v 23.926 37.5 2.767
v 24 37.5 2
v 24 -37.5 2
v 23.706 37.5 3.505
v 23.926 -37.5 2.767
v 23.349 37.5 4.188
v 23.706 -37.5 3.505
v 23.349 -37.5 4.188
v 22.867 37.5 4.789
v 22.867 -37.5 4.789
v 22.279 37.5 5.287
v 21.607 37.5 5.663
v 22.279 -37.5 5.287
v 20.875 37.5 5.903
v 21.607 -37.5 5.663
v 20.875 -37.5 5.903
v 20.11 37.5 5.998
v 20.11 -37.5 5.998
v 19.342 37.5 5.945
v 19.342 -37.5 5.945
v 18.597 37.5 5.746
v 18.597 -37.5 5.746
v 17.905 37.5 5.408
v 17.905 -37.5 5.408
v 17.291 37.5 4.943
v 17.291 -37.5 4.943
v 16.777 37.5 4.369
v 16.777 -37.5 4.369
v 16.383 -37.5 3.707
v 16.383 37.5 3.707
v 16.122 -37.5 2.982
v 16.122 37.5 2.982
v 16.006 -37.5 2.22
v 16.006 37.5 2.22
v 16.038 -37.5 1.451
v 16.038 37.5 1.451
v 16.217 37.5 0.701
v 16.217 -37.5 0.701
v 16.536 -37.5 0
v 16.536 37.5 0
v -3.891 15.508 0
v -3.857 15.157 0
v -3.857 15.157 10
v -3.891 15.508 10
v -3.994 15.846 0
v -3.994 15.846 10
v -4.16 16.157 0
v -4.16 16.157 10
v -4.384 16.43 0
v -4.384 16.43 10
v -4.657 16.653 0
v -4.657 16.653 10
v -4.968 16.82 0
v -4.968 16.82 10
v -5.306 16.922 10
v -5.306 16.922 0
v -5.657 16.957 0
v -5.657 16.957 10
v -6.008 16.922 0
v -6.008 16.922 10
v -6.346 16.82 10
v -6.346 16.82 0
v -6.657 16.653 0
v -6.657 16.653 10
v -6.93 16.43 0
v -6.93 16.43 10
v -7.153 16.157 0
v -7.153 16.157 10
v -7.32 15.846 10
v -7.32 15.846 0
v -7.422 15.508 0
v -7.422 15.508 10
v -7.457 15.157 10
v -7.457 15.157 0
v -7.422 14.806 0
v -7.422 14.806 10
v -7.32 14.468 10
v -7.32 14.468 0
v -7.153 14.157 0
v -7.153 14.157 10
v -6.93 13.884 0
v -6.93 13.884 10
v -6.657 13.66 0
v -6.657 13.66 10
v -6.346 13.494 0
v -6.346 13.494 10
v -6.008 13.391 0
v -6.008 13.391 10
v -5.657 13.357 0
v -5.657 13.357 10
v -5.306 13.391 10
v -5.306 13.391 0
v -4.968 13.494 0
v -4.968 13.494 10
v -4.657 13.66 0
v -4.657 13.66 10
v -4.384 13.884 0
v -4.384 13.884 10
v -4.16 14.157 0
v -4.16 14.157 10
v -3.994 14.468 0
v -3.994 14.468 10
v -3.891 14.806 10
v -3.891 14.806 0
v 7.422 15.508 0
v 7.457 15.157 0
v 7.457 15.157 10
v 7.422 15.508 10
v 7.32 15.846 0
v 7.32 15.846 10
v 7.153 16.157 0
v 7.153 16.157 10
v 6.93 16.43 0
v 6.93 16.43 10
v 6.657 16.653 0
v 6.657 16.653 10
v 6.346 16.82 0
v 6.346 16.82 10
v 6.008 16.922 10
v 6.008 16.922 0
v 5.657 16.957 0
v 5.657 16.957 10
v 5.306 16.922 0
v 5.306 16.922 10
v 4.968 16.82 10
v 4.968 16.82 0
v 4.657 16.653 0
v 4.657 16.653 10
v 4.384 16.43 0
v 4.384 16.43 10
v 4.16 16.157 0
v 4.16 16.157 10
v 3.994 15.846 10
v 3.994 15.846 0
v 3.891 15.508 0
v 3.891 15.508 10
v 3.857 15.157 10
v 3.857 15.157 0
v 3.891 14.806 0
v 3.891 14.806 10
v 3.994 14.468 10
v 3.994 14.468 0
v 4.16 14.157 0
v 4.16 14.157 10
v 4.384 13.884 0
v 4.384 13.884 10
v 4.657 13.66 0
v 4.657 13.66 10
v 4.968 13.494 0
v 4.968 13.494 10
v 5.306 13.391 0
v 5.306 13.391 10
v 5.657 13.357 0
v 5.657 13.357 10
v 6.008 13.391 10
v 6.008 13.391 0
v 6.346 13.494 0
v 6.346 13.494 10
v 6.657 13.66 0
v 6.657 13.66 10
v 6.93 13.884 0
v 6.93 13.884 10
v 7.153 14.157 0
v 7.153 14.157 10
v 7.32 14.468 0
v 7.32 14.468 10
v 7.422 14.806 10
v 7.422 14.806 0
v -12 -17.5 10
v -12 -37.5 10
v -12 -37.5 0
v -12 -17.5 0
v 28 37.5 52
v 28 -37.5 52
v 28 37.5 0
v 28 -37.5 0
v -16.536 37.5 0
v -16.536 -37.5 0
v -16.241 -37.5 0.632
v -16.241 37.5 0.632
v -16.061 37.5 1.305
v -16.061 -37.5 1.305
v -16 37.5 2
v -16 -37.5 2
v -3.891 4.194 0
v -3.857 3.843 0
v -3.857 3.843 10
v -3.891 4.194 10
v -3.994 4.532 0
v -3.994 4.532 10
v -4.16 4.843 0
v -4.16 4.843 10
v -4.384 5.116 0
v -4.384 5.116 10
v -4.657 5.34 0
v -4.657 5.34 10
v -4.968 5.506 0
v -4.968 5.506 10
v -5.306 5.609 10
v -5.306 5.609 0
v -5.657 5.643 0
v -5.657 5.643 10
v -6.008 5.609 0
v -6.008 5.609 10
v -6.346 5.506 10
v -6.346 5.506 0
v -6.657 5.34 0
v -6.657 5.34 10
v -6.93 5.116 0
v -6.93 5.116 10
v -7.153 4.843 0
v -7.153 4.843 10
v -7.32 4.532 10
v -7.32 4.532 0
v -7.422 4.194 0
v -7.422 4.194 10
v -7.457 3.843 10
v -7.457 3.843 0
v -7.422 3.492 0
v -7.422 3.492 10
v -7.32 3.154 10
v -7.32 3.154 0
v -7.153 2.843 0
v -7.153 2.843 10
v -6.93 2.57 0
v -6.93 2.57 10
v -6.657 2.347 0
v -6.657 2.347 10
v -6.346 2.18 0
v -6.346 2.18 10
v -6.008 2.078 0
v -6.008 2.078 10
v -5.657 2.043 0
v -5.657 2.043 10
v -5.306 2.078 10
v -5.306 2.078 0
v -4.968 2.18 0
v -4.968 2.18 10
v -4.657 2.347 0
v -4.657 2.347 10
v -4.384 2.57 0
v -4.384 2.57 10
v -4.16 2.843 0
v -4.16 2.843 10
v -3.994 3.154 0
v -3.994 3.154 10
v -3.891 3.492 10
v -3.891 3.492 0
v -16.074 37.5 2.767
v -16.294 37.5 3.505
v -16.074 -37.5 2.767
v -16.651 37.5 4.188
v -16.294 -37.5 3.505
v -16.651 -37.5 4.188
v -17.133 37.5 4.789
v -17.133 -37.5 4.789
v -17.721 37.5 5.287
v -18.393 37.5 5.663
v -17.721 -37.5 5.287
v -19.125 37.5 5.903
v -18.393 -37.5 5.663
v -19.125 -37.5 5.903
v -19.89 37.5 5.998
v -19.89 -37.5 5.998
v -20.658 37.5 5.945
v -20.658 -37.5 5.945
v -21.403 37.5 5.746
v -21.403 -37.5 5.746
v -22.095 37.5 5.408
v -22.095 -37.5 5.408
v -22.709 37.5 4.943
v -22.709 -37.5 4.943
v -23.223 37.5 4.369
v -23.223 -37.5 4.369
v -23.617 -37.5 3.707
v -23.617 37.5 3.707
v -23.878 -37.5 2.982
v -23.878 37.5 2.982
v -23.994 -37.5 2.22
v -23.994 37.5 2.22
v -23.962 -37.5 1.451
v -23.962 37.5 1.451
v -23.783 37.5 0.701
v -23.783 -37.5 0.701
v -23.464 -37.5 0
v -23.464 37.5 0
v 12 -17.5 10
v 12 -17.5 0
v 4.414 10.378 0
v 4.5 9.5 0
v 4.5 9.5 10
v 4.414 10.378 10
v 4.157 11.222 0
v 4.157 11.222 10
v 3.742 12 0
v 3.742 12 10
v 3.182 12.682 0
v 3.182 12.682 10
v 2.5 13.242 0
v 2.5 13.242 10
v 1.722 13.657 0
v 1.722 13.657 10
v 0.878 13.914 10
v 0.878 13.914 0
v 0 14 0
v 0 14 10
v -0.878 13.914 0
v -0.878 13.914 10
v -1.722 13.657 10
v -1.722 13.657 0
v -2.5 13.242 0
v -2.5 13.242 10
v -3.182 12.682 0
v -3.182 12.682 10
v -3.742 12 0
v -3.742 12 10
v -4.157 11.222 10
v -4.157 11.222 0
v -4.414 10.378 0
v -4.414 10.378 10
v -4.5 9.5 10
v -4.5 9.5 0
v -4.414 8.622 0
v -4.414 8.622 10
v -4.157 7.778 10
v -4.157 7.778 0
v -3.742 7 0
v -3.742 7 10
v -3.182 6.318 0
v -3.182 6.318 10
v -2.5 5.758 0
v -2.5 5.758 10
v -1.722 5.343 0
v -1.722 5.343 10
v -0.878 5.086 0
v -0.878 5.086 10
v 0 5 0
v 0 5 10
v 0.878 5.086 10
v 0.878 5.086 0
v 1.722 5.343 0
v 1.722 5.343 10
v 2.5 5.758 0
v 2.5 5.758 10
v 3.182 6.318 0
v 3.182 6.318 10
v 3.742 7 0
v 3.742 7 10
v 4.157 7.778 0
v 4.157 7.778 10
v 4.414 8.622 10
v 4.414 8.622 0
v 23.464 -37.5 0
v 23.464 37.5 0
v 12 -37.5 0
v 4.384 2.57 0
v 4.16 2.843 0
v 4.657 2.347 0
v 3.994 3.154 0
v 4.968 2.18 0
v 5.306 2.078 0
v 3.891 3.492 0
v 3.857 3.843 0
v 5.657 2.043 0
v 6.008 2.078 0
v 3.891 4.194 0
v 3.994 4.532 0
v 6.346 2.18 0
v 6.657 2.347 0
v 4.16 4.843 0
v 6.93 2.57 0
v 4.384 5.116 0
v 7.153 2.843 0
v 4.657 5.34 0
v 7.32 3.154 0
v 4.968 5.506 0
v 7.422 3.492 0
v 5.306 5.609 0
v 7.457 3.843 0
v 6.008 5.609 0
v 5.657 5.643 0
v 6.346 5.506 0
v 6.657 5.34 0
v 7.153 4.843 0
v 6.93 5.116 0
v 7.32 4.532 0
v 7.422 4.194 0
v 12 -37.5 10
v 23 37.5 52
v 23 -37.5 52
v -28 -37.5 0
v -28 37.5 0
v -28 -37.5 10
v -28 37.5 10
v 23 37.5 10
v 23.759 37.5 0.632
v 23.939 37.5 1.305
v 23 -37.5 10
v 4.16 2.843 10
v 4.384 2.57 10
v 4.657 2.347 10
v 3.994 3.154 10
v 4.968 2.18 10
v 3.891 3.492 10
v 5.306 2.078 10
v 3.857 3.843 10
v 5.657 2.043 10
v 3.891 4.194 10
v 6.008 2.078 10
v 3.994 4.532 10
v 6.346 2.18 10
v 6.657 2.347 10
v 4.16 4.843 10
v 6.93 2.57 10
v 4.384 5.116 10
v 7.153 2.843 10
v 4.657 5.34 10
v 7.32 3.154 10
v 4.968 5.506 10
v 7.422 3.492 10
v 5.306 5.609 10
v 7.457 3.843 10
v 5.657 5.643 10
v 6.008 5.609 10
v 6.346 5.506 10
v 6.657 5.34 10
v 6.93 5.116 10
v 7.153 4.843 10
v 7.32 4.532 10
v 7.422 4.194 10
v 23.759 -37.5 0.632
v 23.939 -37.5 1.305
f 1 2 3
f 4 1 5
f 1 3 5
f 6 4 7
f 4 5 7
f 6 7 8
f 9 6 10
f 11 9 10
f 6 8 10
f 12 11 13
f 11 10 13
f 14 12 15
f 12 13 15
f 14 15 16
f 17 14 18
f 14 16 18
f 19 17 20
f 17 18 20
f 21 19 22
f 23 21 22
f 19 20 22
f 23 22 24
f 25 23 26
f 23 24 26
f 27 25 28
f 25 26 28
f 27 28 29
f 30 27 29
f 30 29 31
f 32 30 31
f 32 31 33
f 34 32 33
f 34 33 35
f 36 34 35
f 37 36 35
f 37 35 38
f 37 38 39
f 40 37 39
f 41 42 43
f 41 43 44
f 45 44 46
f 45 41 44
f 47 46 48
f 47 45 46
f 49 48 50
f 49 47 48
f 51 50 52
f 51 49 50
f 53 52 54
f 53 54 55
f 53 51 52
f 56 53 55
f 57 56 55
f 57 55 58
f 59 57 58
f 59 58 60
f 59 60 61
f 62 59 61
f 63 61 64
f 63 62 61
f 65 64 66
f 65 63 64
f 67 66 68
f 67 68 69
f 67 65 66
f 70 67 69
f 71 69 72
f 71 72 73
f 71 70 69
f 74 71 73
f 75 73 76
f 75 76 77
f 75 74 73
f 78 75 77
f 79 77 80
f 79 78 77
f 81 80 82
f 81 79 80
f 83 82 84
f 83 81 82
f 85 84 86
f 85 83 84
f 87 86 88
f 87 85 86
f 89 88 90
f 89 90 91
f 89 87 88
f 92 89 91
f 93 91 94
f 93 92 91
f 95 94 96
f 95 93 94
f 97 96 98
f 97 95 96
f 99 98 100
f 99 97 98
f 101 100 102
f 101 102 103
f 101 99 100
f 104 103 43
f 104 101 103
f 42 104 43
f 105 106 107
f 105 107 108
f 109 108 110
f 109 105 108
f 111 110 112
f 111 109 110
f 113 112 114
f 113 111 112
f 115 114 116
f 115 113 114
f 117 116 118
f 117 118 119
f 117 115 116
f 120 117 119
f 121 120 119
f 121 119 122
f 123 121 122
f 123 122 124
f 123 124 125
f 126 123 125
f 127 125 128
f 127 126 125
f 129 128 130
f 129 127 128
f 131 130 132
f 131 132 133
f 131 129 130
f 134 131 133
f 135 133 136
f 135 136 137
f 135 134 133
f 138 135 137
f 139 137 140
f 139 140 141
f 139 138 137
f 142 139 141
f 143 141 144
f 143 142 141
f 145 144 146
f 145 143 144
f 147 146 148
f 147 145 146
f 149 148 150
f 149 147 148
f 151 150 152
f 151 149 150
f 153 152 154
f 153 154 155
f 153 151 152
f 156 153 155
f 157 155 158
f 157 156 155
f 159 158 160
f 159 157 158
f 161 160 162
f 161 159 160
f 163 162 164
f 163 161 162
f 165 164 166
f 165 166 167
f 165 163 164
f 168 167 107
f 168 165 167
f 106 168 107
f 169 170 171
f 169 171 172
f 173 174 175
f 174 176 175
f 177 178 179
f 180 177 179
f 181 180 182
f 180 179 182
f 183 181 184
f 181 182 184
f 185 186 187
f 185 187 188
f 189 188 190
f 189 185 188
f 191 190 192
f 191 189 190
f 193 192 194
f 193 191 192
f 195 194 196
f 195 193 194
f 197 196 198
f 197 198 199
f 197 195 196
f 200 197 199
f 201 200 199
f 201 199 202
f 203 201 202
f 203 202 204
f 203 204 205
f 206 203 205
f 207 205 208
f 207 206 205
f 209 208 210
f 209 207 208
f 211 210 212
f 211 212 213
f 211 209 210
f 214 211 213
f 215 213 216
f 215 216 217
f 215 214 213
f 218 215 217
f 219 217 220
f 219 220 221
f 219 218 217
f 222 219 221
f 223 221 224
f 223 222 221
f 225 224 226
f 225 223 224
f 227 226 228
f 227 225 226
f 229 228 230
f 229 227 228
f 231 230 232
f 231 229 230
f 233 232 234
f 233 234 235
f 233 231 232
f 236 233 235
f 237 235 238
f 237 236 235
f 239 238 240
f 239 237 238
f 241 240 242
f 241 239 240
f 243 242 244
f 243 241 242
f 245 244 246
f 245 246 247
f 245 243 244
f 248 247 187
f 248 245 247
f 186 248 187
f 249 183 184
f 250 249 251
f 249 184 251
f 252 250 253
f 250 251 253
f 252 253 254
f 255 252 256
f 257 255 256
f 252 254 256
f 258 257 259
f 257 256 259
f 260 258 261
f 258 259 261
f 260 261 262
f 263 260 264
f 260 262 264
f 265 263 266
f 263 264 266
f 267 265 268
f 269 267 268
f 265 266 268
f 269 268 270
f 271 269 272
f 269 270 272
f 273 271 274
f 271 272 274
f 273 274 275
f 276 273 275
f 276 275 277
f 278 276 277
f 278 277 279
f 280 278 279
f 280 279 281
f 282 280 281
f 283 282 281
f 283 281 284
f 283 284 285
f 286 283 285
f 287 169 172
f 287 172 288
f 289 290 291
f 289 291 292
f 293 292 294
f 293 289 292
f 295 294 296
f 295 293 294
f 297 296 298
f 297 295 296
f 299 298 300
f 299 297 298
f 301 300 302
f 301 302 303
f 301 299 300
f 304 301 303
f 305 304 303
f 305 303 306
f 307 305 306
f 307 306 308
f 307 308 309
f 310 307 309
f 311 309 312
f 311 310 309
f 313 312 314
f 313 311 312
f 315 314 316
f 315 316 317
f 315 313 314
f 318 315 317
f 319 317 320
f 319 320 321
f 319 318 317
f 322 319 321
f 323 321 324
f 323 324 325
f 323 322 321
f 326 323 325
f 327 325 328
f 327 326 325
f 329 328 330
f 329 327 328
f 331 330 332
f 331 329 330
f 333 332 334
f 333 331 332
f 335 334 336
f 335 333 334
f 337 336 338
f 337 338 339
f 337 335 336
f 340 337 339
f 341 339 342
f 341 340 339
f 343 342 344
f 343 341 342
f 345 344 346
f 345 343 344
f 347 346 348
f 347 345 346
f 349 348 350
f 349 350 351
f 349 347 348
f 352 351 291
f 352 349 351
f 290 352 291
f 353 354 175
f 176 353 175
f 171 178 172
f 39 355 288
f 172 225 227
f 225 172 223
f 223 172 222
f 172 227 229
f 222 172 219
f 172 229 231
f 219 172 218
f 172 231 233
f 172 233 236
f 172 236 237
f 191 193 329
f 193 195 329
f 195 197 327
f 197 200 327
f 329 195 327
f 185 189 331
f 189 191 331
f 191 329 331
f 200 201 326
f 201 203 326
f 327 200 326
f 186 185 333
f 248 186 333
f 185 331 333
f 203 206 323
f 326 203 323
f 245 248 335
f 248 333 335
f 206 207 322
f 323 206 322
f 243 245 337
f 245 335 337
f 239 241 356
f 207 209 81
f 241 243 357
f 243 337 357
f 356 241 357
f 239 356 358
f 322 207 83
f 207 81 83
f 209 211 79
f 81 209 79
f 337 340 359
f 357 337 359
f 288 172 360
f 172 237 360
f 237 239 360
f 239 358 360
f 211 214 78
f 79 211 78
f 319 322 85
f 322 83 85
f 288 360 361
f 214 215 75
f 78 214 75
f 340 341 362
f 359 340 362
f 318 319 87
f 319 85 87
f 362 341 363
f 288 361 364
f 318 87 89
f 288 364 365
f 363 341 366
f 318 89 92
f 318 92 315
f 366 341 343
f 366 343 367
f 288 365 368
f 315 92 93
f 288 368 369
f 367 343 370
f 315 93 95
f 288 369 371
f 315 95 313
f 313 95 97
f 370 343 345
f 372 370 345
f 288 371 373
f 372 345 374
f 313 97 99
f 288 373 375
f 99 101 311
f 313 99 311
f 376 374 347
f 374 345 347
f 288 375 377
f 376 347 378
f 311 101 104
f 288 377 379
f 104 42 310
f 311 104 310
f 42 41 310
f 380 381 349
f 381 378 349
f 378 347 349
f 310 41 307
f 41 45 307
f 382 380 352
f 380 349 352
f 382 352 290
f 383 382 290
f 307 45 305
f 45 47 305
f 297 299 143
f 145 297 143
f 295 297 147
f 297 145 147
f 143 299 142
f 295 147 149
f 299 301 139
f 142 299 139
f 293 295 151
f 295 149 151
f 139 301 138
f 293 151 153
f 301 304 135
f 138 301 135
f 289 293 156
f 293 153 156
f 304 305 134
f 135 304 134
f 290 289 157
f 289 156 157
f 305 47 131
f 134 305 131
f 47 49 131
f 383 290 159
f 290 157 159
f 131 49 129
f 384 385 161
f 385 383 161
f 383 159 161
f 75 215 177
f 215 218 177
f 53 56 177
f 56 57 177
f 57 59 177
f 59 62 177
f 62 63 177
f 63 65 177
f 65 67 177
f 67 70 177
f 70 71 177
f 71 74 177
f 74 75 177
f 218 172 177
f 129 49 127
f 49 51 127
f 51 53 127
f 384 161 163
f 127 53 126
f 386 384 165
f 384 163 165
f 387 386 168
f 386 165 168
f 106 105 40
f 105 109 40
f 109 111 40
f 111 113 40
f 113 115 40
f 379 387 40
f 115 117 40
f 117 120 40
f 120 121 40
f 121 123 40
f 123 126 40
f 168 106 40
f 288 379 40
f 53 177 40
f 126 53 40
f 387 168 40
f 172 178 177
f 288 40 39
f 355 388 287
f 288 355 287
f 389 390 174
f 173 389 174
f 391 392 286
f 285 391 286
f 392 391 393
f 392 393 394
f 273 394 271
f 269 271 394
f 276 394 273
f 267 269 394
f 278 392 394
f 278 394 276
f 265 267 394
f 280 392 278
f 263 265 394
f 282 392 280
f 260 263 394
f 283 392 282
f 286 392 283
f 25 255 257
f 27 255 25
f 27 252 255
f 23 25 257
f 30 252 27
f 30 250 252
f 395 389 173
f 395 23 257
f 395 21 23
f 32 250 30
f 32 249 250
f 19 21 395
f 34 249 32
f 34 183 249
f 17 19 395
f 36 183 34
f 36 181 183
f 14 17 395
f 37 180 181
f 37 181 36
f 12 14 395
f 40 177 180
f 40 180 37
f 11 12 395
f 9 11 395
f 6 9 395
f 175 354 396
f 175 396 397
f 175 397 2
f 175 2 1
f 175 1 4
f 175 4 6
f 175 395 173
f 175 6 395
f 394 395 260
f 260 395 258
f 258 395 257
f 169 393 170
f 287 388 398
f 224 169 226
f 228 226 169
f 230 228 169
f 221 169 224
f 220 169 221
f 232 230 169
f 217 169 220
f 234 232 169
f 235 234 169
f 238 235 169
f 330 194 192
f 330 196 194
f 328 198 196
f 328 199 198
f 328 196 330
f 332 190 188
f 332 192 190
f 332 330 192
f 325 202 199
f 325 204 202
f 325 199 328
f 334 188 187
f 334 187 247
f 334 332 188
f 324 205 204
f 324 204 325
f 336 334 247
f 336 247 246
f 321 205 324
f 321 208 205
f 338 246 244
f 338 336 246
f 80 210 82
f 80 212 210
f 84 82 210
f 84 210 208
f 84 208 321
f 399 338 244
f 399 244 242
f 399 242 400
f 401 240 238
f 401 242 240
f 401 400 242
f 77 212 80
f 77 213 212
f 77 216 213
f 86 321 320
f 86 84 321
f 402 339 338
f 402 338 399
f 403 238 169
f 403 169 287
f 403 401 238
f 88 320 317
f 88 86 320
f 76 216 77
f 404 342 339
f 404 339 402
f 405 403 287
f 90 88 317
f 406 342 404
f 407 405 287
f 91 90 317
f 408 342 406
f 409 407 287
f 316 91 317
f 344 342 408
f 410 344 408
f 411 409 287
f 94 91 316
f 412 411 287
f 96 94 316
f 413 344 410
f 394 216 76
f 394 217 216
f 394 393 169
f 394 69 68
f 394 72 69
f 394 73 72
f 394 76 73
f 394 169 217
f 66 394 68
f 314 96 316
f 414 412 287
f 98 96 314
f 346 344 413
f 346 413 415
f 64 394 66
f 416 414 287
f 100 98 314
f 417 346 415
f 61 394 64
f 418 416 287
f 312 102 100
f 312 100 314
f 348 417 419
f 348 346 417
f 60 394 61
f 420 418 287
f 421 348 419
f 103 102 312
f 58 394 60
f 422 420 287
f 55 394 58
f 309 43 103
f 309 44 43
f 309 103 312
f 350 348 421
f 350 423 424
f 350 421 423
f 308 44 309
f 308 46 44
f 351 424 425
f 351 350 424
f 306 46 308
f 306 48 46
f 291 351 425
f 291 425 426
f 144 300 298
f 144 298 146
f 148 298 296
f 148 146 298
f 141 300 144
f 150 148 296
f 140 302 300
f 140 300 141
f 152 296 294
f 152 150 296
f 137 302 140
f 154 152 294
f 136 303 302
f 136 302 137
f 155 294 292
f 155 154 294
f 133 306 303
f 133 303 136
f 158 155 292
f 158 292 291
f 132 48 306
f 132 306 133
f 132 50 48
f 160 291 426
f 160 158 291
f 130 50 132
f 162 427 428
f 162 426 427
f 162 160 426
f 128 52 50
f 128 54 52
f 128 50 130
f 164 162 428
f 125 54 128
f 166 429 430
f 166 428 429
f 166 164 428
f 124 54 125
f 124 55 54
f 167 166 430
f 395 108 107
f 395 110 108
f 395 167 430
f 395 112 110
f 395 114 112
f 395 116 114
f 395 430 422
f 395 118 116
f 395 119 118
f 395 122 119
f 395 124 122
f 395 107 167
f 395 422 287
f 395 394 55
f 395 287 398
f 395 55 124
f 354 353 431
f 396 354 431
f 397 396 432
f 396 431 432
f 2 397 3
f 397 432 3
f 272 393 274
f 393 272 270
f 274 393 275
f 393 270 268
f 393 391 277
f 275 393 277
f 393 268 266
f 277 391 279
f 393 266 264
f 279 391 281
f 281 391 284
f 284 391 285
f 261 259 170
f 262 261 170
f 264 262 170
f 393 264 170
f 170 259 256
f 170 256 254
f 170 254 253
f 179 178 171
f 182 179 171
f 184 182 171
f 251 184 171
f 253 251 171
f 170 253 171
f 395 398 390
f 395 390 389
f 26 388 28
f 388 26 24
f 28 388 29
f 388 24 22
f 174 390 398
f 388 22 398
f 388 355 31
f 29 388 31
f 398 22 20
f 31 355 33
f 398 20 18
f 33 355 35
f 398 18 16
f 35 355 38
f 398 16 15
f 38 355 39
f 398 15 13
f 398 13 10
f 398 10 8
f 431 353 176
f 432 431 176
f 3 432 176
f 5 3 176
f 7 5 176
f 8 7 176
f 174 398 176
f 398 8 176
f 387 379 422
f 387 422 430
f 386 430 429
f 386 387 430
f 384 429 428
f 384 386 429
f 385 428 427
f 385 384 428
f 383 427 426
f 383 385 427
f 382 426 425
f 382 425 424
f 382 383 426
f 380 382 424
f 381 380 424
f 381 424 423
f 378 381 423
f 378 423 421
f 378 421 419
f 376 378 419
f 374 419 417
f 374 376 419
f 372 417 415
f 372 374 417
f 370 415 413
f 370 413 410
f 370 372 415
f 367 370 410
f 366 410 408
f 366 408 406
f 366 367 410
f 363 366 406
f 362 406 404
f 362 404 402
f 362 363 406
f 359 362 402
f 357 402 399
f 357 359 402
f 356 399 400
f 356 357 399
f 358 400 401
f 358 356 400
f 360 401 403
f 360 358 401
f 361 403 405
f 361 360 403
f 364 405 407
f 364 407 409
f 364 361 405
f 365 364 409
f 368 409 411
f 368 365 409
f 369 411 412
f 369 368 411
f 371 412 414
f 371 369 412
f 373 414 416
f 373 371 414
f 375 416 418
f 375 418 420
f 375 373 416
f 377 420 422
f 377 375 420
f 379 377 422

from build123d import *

# Parameters (mm, degrees)
F0_W     = 56
F0_H     = 75
F0_R     = 1.8
F0_R_2   = 4.5
F1_DEPTH = 10
F3_DEPTH = 75.001
F4_W     = 24
F4_H     = 20
F5_DEPTH = 25
F6_W     = 5
F6_H     = 75
F7_DEPTH = 42


with BuildPart() as f1:
    # F0 (on Top) → F1 (new body)
    with BuildSketch(Plane.XY):
        Rectangle(F0_W, F0_H)
        with Locations((-5.6568542495, 3.8431457505)):
            Circle(F0_R, mode=Mode.SUBTRACT)
        with Locations((-5.6568542495, 15.1568542495)):
            Circle(F0_R, mode=Mode.SUBTRACT)
        with Locations((5.6568542495, 3.8431457505)):
            Circle(F0_R, mode=Mode.SUBTRACT)
        with Locations((0, 9.5)):
            Circle(F0_R_2, mode=Mode.SUBTRACT)
        with Locations((5.6568542495, 15.1568542495)):
            Circle(F0_R, mode=Mode.SUBTRACT)
    extrude(amount=F1_DEPTH)

    # F2 (on face) → F3 (cut, through all)
    with BuildSketch(Plane.XZ.offset(37.5)):
        with BuildLine():
            ThreePointArc((-16.5358983849, 0), (-16.1362966948, 0.9647238196), (-16, 2))
            ThreePointArc((-16, 2), (-21.0352761804, 5.8637033052), (-23.4641016151, 0))
            Line((-23.4641016151, 0), (-16.5358983849, 0))
        make_face()
        with BuildLine():
            ThreePointArc((24, 2), (18.9647238196, 5.8637033052), (16.5358983849, 0))
            Line((16.5358983849, 0), (23.4641016151, 0))
            ThreePointArc((23.4641016151, 0), (23.8637033052, 0.9647238196), (24, 2))
        make_face()
    extrude(amount=-F3_DEPTH, mode=Mode.SUBTRACT)

    # F4 (on face) → F5 (cut)
    with BuildSketch(Plane.XY.offset(10)):
        with Locations((0, -27.5)):
            Rectangle(F4_W, F4_H)
    extrude(amount=-F5_DEPTH, mode=Mode.SUBTRACT)

    # F6 (on face) → F7 (join)
    with BuildSketch(Plane.XY.offset(10)):
        with Locations((25.5, 0)):
            Rectangle(F6_W, F6_H)
    extrude(amount=F7_DEPTH)


solid = f1.part
